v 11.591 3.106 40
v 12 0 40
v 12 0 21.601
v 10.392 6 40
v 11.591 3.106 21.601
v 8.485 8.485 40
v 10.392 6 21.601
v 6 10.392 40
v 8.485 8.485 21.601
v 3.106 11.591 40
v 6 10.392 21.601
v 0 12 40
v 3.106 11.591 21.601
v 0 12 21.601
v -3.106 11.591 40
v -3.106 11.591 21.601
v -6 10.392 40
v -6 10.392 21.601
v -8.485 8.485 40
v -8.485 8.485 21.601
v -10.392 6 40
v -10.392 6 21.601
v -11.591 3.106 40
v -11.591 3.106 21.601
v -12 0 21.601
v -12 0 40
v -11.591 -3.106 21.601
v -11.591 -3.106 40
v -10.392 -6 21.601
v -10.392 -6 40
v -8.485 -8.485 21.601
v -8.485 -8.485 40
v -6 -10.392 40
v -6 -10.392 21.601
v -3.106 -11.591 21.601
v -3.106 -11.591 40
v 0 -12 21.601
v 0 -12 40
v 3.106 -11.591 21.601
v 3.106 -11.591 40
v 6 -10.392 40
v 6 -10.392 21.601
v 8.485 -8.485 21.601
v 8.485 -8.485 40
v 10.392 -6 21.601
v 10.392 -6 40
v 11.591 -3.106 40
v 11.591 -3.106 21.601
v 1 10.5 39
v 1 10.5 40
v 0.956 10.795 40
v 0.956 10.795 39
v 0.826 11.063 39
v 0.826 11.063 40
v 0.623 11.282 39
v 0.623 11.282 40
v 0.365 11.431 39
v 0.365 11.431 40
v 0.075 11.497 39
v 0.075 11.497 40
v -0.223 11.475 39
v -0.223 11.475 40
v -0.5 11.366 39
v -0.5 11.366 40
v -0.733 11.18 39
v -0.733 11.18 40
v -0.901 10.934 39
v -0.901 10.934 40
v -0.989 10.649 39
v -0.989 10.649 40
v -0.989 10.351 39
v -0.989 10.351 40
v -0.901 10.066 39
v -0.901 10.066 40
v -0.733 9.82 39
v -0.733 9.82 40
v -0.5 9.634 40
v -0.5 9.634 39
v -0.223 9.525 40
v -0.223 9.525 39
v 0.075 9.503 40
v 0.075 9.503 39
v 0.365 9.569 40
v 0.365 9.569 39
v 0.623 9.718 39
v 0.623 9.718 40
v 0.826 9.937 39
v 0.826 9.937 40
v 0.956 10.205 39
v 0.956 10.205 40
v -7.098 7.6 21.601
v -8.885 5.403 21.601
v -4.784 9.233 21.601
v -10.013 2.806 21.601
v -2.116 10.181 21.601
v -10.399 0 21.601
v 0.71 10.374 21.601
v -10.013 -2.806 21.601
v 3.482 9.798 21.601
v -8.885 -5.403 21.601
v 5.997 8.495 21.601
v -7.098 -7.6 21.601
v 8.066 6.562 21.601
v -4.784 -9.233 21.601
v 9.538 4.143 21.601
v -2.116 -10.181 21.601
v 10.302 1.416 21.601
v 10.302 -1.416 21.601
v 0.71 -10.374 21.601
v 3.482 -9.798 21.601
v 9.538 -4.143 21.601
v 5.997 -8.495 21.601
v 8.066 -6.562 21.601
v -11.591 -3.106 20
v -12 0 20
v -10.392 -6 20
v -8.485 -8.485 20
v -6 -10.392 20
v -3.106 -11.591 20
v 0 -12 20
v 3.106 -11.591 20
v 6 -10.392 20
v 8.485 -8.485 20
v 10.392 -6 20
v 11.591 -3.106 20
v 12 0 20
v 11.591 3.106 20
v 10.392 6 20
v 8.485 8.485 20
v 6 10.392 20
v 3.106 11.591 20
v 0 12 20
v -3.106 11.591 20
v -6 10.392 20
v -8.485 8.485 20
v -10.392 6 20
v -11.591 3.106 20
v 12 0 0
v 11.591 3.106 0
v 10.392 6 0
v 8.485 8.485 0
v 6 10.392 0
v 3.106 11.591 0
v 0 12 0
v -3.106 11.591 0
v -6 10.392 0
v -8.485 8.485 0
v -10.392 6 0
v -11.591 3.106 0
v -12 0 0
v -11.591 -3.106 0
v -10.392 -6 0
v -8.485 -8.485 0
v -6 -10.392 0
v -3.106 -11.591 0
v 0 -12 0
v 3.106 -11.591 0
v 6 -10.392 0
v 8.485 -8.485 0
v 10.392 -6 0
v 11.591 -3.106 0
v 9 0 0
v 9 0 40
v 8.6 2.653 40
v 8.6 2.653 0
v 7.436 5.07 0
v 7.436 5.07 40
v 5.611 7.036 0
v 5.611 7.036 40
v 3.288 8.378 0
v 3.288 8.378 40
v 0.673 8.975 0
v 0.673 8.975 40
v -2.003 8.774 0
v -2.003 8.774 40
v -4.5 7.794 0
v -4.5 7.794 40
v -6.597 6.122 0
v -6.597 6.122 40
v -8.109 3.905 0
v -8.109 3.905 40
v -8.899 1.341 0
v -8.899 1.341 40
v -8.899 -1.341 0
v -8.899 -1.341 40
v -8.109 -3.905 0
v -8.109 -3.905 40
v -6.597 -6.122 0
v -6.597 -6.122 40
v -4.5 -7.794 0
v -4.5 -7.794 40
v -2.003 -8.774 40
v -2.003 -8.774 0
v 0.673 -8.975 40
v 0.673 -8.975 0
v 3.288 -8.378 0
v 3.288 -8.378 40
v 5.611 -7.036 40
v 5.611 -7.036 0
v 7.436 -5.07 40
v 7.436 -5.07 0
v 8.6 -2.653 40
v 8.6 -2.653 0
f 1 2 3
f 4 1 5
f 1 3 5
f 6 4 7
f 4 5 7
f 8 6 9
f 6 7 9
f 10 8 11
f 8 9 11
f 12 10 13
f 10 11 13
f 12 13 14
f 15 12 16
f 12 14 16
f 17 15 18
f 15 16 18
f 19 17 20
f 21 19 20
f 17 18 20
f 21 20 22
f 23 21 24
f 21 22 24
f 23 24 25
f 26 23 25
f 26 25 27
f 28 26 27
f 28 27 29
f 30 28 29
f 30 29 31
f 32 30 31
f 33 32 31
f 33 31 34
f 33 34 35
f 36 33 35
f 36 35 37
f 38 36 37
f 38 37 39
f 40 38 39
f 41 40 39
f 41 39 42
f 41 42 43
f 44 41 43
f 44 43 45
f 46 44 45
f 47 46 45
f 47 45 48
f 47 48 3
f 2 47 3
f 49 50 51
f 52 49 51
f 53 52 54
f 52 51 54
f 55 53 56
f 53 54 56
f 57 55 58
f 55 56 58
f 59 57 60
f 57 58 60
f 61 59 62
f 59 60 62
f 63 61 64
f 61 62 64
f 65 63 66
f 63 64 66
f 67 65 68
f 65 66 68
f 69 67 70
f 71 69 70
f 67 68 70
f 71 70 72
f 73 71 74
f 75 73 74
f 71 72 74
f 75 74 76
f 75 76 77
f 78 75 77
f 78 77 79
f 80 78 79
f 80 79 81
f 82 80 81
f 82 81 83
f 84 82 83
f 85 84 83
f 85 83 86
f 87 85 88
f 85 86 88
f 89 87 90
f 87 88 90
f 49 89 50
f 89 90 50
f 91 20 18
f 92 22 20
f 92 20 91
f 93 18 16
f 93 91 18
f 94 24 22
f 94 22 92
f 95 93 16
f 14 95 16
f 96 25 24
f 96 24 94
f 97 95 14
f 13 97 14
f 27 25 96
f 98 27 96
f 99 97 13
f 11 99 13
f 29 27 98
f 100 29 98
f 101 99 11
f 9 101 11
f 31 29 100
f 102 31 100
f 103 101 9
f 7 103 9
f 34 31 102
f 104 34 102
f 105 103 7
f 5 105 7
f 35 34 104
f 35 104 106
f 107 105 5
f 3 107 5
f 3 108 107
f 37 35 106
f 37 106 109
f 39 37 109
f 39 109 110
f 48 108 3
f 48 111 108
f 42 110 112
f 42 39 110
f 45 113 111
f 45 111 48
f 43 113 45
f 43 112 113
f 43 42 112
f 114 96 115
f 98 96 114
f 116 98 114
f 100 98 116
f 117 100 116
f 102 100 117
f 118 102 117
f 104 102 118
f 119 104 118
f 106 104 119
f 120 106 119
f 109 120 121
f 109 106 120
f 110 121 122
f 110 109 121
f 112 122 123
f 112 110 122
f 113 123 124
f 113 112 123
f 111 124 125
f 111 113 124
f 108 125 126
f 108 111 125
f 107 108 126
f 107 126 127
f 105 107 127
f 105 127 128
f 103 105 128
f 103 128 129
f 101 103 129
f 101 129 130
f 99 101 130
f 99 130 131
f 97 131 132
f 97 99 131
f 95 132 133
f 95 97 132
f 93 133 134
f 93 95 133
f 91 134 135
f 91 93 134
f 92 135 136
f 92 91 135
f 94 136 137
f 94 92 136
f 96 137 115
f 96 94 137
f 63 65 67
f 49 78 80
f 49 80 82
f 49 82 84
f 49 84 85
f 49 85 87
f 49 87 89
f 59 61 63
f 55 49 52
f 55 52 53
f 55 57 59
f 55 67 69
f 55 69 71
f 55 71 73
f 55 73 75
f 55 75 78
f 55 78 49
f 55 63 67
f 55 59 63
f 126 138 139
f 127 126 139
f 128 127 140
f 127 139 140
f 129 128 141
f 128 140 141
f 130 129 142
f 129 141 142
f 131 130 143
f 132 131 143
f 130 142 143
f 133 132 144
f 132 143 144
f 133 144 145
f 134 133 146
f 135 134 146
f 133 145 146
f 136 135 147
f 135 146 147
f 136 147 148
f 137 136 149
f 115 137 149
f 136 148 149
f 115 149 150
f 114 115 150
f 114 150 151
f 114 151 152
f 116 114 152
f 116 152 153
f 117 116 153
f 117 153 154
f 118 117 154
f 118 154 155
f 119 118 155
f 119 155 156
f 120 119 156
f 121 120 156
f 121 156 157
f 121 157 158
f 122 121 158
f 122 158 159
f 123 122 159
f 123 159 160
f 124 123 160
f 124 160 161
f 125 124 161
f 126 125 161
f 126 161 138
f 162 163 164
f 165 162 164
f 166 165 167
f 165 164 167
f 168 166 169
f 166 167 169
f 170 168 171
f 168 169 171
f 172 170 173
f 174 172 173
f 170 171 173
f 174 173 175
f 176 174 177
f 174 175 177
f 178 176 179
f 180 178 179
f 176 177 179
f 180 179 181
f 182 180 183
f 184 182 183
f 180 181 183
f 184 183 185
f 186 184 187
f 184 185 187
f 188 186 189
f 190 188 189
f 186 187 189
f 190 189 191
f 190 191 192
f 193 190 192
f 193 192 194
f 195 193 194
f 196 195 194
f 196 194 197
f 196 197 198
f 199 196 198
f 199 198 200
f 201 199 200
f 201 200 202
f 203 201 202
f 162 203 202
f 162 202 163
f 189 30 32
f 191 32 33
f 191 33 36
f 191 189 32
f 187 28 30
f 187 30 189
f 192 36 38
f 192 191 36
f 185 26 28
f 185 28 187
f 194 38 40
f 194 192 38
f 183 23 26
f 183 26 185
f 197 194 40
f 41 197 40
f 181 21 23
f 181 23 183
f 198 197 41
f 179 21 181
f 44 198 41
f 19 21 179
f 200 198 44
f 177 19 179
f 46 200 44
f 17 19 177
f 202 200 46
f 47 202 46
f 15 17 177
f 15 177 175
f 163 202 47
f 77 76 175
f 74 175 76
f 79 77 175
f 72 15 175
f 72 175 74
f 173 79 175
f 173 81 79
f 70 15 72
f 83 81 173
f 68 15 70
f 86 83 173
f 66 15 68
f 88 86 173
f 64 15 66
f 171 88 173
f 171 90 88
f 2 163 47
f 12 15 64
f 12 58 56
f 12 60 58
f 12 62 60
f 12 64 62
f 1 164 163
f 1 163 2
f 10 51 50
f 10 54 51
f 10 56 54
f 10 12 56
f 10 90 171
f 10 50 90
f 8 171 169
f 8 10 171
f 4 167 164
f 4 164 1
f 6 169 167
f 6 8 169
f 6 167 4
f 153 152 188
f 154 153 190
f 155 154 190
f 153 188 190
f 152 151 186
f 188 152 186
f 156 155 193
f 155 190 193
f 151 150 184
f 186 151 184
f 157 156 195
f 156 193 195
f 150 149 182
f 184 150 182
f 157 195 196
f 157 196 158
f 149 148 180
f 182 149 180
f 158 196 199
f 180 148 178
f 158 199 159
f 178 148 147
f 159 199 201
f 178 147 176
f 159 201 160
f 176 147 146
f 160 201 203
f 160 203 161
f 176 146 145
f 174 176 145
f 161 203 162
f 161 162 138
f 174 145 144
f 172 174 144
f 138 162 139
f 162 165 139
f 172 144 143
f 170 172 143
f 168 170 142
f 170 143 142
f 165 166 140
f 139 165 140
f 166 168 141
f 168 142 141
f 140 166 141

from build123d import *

# Parameters (mm, degrees)
F0_R     = 12
F1_DEPTH = 40
F2_R     = 9
F3_DEPTH = 40.001
F7_R     = 1
F8_DEPTH = 1


with BuildPart() as f1:
    # F0 (on Top) → F1 (new body)
    with BuildSketch(Plane.XY):
        Circle(F0_R)
    extrude(amount=F1_DEPTH)

    # F2 (on face) → F3 (cut, through all)
    with BuildSketch(Plane.XY.offset(40)):
        Circle(F2_R)
    extrude(amount=-F3_DEPTH, mode=Mode.SUBTRACT)

    # F4 (on Front) → F6 (revolve, cut)
    with BuildSketch(Plane.XZ):
        Polygon((-12, 21.60143), (-12, 20), (-10.39857, 21.60143), align=None)
    revolve(axis=Axis((0, 0, 20.635139), (0, 0, 1)), mode=Mode.SUBTRACT)

    # F7 (on face) → F8 (cut)
    with BuildSketch(Plane.XY.offset(40)):
        with Locations((0, 10.5)):
            Circle(F7_R)
    extrude(amount=-F8_DEPTH, mode=Mode.SUBTRACT)


solid = f1.part
